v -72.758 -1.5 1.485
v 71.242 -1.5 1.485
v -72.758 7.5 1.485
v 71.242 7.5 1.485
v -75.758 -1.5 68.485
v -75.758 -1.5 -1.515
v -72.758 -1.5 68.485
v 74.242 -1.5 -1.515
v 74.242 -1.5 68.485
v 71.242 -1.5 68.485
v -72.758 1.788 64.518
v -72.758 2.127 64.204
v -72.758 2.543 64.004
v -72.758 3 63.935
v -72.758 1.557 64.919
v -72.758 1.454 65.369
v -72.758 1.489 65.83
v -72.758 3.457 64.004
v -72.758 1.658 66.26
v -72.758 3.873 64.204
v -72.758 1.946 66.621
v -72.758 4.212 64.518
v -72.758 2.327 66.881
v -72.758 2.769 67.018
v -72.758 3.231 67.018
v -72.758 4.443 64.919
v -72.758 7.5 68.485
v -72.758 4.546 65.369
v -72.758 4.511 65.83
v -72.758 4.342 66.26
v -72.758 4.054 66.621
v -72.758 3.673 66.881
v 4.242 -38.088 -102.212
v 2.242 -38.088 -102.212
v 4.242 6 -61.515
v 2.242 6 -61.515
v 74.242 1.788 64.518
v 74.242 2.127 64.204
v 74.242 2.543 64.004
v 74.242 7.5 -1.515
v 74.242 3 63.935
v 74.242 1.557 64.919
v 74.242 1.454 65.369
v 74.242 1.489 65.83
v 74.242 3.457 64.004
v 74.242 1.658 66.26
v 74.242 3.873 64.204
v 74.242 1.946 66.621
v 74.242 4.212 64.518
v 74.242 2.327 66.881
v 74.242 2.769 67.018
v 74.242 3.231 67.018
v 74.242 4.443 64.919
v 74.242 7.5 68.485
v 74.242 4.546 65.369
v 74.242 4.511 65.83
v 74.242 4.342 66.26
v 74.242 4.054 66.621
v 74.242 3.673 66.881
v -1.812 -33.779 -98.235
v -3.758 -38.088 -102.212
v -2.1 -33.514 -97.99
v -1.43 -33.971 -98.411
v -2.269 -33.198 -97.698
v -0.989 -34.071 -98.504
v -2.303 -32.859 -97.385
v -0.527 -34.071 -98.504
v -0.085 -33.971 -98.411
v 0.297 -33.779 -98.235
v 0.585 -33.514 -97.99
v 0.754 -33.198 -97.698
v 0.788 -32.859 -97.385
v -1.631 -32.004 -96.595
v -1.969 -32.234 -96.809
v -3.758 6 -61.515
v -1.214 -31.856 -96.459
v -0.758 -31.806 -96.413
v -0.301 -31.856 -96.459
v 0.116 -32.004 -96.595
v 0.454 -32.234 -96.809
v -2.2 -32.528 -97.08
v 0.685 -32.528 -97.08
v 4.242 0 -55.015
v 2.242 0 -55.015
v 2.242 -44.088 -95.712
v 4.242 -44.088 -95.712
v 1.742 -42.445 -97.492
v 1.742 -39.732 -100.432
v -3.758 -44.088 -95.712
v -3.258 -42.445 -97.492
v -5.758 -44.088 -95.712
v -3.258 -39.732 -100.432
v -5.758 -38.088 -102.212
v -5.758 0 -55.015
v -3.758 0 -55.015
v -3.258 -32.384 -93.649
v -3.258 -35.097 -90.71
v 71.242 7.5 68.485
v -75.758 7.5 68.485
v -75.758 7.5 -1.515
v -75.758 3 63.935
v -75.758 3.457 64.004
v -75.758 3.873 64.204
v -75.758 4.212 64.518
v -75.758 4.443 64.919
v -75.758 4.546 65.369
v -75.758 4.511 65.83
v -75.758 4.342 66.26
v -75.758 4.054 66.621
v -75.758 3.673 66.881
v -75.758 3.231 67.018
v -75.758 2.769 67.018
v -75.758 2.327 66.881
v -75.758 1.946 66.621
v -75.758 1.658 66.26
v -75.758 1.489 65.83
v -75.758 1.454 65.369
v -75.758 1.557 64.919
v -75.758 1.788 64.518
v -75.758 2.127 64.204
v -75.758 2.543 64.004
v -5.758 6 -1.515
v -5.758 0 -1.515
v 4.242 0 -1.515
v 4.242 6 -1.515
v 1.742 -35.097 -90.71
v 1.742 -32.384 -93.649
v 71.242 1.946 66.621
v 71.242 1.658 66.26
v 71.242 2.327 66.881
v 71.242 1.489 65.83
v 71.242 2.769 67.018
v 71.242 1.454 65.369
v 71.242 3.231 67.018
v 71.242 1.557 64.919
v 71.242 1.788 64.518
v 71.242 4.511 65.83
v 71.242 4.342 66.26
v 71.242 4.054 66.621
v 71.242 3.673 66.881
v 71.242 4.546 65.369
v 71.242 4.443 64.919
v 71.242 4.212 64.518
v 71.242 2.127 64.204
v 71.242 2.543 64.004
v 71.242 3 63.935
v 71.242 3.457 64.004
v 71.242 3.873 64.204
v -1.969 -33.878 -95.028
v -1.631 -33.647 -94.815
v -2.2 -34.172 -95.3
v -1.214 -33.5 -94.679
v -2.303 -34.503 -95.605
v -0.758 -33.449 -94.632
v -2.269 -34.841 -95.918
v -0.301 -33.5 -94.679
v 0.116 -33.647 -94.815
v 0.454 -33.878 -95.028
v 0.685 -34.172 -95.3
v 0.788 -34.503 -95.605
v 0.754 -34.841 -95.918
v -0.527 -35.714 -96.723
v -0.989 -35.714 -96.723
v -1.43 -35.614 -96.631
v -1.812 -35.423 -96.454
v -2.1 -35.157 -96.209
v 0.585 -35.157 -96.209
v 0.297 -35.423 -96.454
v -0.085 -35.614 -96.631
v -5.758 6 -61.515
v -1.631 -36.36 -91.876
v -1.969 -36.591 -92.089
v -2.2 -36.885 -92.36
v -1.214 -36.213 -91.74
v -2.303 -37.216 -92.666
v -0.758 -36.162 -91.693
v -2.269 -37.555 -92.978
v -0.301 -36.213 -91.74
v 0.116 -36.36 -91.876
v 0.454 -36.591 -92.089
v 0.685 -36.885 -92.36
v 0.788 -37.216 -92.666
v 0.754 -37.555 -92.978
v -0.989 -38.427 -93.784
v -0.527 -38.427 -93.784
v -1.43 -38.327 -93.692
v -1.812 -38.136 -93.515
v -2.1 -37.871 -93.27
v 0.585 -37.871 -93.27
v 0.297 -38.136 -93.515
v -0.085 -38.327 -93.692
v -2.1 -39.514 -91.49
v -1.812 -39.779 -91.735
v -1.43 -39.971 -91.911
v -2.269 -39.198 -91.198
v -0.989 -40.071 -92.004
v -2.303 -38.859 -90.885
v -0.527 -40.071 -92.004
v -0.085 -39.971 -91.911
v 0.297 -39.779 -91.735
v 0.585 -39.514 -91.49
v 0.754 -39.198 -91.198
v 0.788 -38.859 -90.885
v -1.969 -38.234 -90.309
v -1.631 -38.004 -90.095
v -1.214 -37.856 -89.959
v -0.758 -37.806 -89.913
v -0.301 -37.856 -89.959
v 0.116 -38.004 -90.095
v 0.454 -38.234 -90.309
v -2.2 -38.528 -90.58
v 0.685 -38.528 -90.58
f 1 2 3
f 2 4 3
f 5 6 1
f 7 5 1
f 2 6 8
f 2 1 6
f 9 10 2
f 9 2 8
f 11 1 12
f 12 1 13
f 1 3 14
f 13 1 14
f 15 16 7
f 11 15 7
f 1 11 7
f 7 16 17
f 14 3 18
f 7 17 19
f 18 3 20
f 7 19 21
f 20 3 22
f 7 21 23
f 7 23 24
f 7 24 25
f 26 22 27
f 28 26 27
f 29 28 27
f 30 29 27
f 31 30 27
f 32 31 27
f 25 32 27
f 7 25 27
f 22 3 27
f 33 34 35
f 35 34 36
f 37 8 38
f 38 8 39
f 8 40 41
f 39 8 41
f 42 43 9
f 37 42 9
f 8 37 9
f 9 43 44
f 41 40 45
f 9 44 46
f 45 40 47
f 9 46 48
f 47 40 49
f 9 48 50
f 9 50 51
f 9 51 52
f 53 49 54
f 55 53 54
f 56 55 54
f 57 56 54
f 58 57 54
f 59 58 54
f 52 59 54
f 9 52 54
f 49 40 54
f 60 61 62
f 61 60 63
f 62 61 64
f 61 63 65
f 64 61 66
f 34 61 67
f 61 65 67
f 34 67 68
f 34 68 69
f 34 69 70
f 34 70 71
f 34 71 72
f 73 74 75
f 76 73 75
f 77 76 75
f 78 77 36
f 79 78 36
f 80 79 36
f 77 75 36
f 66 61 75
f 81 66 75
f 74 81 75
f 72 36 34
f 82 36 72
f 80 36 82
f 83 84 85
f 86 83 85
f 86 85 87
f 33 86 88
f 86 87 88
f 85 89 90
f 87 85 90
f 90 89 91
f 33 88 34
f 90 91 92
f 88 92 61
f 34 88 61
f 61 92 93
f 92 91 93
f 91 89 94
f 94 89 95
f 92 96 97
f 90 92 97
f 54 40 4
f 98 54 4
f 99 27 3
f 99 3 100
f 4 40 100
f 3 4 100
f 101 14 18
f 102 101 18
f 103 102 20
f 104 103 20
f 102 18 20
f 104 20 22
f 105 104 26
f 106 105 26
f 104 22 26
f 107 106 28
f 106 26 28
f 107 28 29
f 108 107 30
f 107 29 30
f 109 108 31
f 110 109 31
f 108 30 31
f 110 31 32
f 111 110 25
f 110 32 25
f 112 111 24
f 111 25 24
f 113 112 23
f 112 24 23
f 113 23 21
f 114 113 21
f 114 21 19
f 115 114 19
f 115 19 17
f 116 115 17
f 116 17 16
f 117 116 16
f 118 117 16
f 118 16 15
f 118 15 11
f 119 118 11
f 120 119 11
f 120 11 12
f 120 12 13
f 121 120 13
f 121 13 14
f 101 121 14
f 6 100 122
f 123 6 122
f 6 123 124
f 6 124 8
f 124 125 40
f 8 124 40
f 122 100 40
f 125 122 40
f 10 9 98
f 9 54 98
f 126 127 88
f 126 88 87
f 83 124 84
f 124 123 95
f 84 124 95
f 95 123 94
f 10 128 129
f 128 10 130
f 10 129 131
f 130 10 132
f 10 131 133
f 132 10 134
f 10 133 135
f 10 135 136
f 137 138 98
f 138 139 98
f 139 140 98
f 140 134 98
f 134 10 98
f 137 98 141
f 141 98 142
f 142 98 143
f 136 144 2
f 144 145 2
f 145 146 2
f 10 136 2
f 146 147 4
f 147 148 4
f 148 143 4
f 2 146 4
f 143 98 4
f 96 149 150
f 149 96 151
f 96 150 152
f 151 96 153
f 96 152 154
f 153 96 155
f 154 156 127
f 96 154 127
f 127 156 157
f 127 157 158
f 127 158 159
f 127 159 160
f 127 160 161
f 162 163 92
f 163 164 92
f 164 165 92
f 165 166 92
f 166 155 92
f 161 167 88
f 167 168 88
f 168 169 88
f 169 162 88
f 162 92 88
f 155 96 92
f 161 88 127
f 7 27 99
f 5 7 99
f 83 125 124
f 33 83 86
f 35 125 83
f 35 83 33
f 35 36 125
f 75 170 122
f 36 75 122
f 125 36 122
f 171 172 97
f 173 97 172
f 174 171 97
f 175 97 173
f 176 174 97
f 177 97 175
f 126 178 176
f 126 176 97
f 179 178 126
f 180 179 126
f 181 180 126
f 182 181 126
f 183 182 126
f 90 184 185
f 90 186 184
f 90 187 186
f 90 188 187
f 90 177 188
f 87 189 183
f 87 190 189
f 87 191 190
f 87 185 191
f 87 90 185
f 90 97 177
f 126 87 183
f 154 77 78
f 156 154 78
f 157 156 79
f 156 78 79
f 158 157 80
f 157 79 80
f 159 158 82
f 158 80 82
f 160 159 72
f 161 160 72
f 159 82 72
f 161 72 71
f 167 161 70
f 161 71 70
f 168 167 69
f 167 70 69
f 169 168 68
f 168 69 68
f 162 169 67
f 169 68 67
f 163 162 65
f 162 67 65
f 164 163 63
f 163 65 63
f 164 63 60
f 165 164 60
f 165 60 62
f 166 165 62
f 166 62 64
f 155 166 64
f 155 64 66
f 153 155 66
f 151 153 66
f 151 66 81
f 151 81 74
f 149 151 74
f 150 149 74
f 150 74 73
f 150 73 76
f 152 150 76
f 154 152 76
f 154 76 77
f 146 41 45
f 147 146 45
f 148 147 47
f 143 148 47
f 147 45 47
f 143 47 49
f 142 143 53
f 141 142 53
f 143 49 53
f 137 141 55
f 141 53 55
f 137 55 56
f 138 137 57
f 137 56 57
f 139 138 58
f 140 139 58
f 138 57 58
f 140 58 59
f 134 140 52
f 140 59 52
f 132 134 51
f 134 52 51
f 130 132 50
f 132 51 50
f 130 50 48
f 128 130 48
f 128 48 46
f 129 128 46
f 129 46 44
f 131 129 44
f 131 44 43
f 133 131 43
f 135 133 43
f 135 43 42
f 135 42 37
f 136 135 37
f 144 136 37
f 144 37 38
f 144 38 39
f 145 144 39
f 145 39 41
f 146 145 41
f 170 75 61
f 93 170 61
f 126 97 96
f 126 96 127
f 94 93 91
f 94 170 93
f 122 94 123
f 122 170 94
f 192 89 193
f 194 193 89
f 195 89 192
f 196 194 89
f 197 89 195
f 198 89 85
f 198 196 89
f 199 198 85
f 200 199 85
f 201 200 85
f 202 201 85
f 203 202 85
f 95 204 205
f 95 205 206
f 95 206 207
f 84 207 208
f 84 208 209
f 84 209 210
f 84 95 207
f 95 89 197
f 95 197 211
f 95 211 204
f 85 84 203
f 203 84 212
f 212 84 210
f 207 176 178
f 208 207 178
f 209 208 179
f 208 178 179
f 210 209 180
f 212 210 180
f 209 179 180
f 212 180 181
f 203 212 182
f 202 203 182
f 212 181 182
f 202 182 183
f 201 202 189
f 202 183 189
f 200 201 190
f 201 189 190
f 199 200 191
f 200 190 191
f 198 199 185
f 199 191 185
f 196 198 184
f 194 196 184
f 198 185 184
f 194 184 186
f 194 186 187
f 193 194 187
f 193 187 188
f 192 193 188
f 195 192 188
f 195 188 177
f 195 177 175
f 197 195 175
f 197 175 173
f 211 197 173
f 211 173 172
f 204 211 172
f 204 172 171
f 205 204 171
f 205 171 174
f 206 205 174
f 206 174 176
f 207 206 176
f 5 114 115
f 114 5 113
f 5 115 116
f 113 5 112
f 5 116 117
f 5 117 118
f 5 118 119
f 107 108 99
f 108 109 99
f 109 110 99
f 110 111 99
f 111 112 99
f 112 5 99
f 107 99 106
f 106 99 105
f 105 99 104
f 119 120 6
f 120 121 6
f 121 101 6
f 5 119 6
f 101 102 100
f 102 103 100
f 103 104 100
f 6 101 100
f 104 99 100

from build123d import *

# Parameters (mm, degrees)
EXTRUDE_2_DEPTH     = 6
SKETCH_2_R          = 1.55
CUT_EXTRUDE_1_DEPTH = 10
SKETCH_3_R          = 1.55
CUT_EXTRUDE_2_DEPTH = 10
EXTRUDE_4_DEPTH     = 1.5
EXTRUDE_5_DEPTH     = 1.5
SKETCH_5_W          = 6
SKETCH_5_H          = 6
EXTRUDE_6_DEPTH     = 60
CUT_EXTRUDE_3_DEPTH = 60
SKETCH_9_W          = 6
SKETCH_9_H          = 8.845903007
EXTRUDE_7_DEPTH     = 60
SKETCH_11_R         = 1.55
CUT_EXTRUDE_5_DEPTH = 10
SKETCH_10_W         = 5
SKETCH_10_H         = 4
CUT_EXTRUDE_6_DEPTH = 10
EXTRUDE_8_DEPTH     = 2
EXTRUDE_9_DEPTH     = 2


with BuildPart() as part:
    # 草图1 → 凸台-拉伸2 (new body)
    with BuildSketch(Plane(origin=(0, 0, 0), x_dir=(1, 0, 0), z_dir=(0, 1, 0))):
        Polygon((-72.757575758, -68.484848485), (-72.757575758, -1.484848485), (71.242424242, -1.484848485), (71.242424242, -68.484848485), (74.242424242, -68.484848485), (74.242424242, -1.484848485), (74.242424242, 1.515151515), (71.242424242, 1.515151515), (-72.757575758, 1.515151515), (-75.757575758, 1.515151515), (-75.757575758, -1.484848485), (-75.757575758, -68.484848485), align=None)
    extrude(amount=EXTRUDE_2_DEPTH)

    # 草图2 → 切除-拉伸1 (cut)
    with BuildSketch(Plane(origin=(-72.757575758, 0, 0), x_dir=(0, 0, -1), z_dir=(1, 0, 0))):
        with Locations((-65.484848485, 3)):
            Circle(SKETCH_2_R)
    extrude(amount=-CUT_EXTRUDE_1_DEPTH, mode=Mode.SUBTRACT)

    # 草图3 → 切除-拉伸2 (cut)
    with BuildSketch(Plane(origin=(74.242424242, 0, 0), x_dir=(0, 0, -1), z_dir=(1, 0, 0))):
        with Locations((-65.484848485, 3)):
            Circle(SKETCH_3_R)
    extrude(amount=-CUT_EXTRUDE_2_DEPTH, mode=Mode.SUBTRACT)

    # 草图6 → 凸台-拉伸4 (add)
    with BuildSketch(Plane(origin=(0, 6, 0), x_dir=(1, 0, 0), z_dir=(0, 1, 0))):
        Polygon((-75.757575758, 1.515151515), (74.242424242, 1.515151515), (74.242424242, -68.484848485), (71.242424242, -68.484848485), (71.242424242, -1.484848485), (-72.757575758, -1.484848485), (-72.757575758, -68.484848485), (-75.757575758, -68.484848485), align=None)
    extrude(amount=EXTRUDE_4_DEPTH)

    # 草图7 → 凸台-拉伸5 (add)
    with BuildSketch(Plane.XZ):
        Polygon((-75.757575758, 68.484848485), (-75.757575758, -1.515151515), (74.242424242, -1.515151515), (74.242424242, 68.484848485), (71.242424242, 68.484848485), (71.242424242, 1.484848485), (-72.757575758, 1.484848485), (-72.757575758, 68.484848485), align=None)
    extrude(amount=EXTRUDE_5_DEPTH)

    # 草图5 → 凸台-拉伸6 (add)
    with BuildSketch(Plane(origin=(0, 0, -1.515151515), x_dir=(-1, 0, 0), z_dir=(0, 0, -1))):
        with Locations((0.757575758, 3)):
            Rectangle(SKETCH_5_W, SKETCH_5_H)
    extrude(amount=EXTRUDE_6_DEPTH)

    # 草图8 → 切除-拉伸3 (cut)
    with BuildSketch(Plane(origin=(2.242424242, 0, 0), x_dir=(0, 0, -1), z_dir=(1, 0, 0))):
        Polygon((61.515151515, 6), (55.015151515, 0), (61.515151515, 0), align=None)
    extrude(amount=-CUT_EXTRUDE_3_DEPTH, mode=Mode.SUBTRACT)

    # 草图9 → 凸台-拉伸7 (add)
    with BuildSketch(Plane(origin=(0, -27.419692129, -25.310485042), x_dir=(1, 0, 0), z_dir=(0, -0.7348034446274878, -0.678280102733066))):
        with Locations((-0.757575758, -44.848274344)):
            Rectangle(SKETCH_9_W, SKETCH_9_H)
    extrude(amount=EXTRUDE_7_DEPTH)

    # 草图11 → 切除-拉伸5 (cut)
    with BuildSketch(Plane(origin=(0, 33.419692129, -36.204666473), x_dir=(-1, 0, 0), z_dir=(0, 0.6782801027330662, -0.7348034446274876))):
        with Locations(Location((0.757575758, -90.315682622, 0), (0, 0, 90))):
            Circle(SKETCH_11_R)
    extrude(amount=-CUT_EXTRUDE_5_DEPTH, mode=Mode.SUBTRACT)

    # 草图10 → 切除-拉伸6 (cut)
    with BuildSketch(Plane(origin=(0, -71.507898807, -66.007291206), x_dir=(1, 0, 0), z_dir=(0, -0.7348034446274876, -0.6782801027330662))):
        with Locations((-0.757575758, -44.848274343)):
            Rectangle(SKETCH_10_W, SKETCH_10_H)
    extrude(amount=-CUT_EXTRUDE_6_DEPTH, mode=Mode.SUBTRACT)

    # 草图12 → 凸台-拉伸8 (add)
    with BuildSketch(Plane.ZY.offset(3.757575758)):
        Polygon((-102.211957679, -38.088206678), (-95.711957679, -44.088206678), (-55.015151515, 0), (-1.515151515, 0), (-1.515151515, 6), (-61.515151515, 6), align=None)
    extrude(amount=EXTRUDE_8_DEPTH)

    # 草图13 → 凸台-拉伸9 (add)
    with BuildSketch(Plane(origin=(2.242424242, 0, 0), x_dir=(0, 0, -1), z_dir=(1, 0, 0))):
        Polygon((95.711957679, -44.088206678), (102.211957679, -38.088206678), (61.515151515, 6), (1.515151515, 6), (1.515151515, 0), (55.015151515, 0), align=None)
    extrude(amount=EXTRUDE_9_DEPTH)


solid = part.part
